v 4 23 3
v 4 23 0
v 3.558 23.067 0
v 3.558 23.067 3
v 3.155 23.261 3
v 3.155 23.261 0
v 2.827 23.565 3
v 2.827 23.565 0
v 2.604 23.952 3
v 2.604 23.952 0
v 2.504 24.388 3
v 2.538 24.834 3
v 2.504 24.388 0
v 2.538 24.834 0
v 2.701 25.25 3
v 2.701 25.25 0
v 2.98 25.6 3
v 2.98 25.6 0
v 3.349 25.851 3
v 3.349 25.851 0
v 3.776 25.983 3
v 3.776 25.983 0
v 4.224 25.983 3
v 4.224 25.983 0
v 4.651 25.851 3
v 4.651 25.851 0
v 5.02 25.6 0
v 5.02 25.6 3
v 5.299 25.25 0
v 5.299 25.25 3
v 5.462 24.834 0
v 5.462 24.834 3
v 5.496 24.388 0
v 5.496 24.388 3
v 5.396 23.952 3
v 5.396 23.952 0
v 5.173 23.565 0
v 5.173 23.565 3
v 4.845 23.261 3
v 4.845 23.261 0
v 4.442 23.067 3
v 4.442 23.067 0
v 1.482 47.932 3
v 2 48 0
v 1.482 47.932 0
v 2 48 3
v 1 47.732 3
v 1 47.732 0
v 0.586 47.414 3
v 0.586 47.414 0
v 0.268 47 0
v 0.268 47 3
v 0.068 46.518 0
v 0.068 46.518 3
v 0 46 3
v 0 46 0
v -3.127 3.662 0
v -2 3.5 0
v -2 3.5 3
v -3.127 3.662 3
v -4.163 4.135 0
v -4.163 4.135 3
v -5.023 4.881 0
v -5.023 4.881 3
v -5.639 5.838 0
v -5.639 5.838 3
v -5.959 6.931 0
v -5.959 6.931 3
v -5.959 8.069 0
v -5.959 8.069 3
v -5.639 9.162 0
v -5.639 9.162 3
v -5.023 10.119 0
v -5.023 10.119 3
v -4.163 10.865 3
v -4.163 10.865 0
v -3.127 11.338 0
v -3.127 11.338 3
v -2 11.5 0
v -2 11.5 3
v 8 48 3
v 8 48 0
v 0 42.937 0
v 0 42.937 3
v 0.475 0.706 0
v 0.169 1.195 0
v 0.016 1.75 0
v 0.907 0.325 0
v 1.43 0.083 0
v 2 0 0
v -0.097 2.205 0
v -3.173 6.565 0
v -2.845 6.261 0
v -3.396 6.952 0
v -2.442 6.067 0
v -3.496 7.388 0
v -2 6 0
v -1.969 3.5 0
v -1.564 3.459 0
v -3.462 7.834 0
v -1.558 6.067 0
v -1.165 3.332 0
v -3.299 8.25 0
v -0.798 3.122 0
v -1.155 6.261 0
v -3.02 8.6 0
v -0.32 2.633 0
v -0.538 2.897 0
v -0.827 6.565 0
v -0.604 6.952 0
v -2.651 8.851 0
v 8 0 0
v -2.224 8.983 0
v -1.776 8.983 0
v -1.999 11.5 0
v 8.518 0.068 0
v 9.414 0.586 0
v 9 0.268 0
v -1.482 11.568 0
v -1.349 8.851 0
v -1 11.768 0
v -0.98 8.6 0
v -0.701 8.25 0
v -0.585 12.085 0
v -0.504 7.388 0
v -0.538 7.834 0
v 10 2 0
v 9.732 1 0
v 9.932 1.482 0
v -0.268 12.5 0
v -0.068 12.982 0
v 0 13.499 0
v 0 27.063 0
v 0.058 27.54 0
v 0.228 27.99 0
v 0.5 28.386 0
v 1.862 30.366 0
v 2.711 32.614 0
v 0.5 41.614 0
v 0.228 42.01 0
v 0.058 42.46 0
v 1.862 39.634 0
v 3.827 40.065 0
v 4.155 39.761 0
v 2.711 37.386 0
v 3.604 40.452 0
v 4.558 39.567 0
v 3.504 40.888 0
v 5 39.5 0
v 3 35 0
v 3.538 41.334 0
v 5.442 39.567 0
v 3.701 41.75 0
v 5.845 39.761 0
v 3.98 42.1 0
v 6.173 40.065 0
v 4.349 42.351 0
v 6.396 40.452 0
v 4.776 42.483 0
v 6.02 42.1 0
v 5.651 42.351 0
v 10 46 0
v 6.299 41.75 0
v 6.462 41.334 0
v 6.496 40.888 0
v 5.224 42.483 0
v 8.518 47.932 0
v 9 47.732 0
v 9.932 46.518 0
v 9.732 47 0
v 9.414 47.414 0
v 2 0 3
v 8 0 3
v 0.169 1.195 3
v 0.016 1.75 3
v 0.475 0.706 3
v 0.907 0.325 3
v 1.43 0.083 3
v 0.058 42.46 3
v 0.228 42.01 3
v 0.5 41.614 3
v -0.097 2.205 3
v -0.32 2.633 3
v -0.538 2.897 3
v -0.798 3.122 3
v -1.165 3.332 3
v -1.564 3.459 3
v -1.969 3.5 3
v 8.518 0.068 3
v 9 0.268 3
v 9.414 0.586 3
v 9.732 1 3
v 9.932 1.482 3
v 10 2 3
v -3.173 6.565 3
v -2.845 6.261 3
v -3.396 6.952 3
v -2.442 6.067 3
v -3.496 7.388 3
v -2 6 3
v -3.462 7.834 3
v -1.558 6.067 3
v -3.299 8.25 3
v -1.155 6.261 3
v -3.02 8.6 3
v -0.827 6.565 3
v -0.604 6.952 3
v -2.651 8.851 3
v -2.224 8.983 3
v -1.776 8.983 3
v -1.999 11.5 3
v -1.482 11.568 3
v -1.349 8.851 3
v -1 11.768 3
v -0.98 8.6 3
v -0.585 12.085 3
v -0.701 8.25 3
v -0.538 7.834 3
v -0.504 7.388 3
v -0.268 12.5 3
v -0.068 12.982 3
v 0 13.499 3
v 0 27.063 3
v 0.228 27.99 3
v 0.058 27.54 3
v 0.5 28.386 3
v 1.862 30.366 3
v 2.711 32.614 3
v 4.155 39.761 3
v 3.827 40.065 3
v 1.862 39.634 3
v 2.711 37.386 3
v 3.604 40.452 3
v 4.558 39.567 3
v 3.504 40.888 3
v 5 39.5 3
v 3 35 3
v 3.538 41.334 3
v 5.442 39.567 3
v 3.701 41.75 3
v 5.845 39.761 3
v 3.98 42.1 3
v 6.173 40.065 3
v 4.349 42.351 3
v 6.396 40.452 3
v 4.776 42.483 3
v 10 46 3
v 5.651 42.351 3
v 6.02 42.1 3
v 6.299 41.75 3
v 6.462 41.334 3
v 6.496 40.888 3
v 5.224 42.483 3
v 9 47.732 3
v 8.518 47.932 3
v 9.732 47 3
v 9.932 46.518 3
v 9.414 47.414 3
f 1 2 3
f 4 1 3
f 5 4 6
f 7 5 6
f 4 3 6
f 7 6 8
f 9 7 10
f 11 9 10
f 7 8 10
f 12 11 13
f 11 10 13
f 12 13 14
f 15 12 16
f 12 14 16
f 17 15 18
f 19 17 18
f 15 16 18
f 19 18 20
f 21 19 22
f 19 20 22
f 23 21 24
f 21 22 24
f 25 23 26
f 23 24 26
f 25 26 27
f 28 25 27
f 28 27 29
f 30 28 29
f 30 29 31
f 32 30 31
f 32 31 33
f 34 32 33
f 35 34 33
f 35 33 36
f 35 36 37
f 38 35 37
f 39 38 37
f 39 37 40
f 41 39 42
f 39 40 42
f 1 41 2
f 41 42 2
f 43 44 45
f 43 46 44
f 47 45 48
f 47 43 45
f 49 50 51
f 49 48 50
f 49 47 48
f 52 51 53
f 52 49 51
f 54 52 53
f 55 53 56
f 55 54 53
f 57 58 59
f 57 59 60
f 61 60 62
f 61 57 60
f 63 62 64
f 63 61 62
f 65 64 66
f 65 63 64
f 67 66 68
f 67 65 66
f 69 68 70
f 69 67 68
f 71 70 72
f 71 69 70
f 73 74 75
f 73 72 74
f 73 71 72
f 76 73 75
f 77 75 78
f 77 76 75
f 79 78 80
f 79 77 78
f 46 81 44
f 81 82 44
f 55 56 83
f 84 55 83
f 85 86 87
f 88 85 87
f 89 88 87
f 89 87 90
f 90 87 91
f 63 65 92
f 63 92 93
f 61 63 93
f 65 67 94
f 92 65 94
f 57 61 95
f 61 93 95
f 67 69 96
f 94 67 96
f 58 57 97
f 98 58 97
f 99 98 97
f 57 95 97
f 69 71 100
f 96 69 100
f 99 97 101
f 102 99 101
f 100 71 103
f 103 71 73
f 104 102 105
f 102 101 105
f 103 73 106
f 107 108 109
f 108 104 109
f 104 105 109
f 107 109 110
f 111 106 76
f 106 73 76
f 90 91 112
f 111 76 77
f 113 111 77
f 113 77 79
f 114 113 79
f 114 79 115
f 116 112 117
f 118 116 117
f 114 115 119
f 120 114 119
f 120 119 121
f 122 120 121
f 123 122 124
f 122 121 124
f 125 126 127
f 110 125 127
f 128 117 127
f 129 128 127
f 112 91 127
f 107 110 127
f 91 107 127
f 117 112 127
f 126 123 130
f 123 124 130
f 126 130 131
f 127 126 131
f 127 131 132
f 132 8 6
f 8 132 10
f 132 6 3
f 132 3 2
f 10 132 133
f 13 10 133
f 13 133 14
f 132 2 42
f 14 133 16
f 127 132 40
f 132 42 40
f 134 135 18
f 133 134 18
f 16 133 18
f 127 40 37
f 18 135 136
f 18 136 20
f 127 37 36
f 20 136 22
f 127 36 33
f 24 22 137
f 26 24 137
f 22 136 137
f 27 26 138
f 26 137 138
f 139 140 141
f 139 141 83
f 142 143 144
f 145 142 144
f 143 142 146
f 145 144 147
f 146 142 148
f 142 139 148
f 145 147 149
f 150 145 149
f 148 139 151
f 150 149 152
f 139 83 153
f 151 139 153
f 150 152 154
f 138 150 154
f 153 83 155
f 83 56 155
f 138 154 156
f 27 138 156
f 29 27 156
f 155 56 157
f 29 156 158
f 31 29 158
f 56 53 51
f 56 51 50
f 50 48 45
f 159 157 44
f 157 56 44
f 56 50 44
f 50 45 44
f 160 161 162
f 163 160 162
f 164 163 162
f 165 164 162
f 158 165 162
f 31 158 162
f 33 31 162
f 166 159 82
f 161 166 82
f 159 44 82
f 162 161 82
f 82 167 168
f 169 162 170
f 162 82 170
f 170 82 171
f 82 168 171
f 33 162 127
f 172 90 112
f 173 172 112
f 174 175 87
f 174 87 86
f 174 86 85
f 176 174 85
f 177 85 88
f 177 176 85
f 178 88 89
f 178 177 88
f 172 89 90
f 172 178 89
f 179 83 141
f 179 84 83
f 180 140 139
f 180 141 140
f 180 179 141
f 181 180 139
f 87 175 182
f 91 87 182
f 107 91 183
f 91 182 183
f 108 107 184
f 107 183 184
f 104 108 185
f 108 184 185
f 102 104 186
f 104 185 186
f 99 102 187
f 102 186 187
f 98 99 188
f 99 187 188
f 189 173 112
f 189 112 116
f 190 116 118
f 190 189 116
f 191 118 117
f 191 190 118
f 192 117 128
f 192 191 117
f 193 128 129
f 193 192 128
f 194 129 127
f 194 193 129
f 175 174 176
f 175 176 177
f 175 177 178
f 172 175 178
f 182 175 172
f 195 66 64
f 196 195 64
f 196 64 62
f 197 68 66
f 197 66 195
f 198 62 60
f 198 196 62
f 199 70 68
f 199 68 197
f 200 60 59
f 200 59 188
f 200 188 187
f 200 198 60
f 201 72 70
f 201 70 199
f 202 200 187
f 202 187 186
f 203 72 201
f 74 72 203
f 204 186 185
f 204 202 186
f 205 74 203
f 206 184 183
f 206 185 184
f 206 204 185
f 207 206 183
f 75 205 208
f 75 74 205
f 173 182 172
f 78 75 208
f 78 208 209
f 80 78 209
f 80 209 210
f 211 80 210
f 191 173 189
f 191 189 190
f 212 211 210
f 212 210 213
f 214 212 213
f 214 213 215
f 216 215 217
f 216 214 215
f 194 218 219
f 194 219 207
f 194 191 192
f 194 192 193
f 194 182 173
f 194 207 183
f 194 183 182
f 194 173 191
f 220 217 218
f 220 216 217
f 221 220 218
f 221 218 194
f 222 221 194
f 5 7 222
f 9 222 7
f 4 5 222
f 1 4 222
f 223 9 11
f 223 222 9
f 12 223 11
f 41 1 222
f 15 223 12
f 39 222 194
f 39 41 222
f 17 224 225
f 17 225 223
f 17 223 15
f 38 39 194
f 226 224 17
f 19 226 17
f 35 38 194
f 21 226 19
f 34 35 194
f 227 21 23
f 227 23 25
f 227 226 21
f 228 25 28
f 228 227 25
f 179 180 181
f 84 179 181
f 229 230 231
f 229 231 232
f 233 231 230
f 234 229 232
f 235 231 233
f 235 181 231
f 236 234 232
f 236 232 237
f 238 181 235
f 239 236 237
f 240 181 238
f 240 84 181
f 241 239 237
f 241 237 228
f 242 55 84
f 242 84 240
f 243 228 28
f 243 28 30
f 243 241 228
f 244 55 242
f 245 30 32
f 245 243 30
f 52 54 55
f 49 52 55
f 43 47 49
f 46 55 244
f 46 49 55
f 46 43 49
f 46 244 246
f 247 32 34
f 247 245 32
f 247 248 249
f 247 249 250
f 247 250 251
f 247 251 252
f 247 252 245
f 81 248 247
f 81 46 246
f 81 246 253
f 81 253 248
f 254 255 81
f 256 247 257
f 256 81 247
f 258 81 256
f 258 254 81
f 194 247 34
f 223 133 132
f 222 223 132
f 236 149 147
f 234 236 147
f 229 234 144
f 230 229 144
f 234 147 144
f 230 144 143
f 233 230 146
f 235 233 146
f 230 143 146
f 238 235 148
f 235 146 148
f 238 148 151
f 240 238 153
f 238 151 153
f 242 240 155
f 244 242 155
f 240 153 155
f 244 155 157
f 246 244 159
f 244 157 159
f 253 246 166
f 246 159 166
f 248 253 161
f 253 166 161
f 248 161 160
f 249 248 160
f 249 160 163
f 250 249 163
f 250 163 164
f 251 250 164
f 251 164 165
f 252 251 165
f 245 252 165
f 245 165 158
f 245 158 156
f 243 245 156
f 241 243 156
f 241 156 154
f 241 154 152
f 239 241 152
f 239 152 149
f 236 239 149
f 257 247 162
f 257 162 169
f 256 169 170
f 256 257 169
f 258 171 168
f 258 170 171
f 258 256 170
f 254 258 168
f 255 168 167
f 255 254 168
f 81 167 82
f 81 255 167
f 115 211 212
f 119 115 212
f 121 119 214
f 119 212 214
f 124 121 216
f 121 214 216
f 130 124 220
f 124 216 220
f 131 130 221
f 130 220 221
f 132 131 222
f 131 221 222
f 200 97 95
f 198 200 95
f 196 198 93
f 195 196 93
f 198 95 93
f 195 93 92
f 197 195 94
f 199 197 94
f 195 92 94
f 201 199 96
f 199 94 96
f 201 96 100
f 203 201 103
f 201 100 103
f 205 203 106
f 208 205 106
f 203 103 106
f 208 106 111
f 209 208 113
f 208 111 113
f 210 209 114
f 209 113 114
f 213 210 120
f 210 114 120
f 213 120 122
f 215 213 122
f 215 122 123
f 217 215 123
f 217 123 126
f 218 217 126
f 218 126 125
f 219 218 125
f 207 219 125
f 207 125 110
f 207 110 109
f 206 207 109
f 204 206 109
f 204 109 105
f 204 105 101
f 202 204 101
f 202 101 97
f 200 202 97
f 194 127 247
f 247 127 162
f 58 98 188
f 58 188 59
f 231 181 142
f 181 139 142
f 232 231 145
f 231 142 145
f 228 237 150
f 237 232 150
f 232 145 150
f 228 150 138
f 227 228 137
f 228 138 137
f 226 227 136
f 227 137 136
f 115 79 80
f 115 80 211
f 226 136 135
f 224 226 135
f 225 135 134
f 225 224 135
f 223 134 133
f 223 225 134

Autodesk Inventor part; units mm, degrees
ref_plane "YZ Plane" through (0, 0, 0) normal (1, 0, 0) x (0, 1, 0)
ref_plane "XZ Plane" through (0, 0, 0) normal (0, 1, 0) x (-1, 0, 0)
ref_plane "XY Plane" through (0, 0, 0) normal (0, 0, 1) x (1, 0, 0)
sketch "Sketch1" plane through (0, 0, 0) normal (0, 0, 1) x (1, 0, 0)
  line L0 (0, 0) -> (10, 0)
  line L1 (10, 0) -> (10, 48)
  line L2 (10, 48) -> (0, 48)
  circle A0 centre (-2, 7.5) radius 4
  arc A1 (0, 27.8586) -> (0, 42.1414) centre (-7, 35) ccw
  line L3 (-2, 11.5) -> (0, 11.5)
  line L4 (0, 11.5) -> (0, 3.5)
  line L5 (0, 3.5) -> (-2, 3.5)
  line L6 (-2, 3.5) -> (-2, 11.5)
  line L7 (0, 48) -> (0, 42.1414)
  line L8 (0, 27.8586) -> (0, 0)
  dimension "d90" = 8
  dimension "d0" = 10
  dimension "d1" = 48
  dimension "d88" = 12
  dimension "d89" = 7.5
  dimension "d91" = 20
  dimension "d92" = 13
extrude "Extrusion1" add sketch "Sketch1" along normal blind 3
fillet "圓角5" radius 2 8 edges at (0, 0, 1.5) (0, 3.5, 1.5) (0, 11.5, 1.5) (10, 0, 1.5) (0, 27.8586, 1.5) (0, 42.1414, 1.5) (0, 48, 1.5) (10, 48, 1.5)
sketch "草圖9" plane through (0, 0, 3) normal (0, 0, 1) x (1, 0, 0)
  line L0 (2, 48) -> (8, 48) projected
  arc A0 (-2, 11.5) -> (-2, 3.5) centre (-2, 7.5) ccw projected
  line L1 (8, 0) -> (2, 0) projected
  line L2 (10, 46) -> (10, 2) projected
  point P0 (0, 0)
  point P1 (4, 24.5)
  point P2 (5, 41)
  dimension "d95" = 6
  dimension "d96" = 24.5
  dimension "d97" = 7
  dimension "d98" = 5
hole "孔5" at (-2, 7.5, 3) at (4, 24.5, 3) at (5, 41, 3) direction (0, 0, -1) diameter 3 end through all
properties part number "plastic_part_53"
